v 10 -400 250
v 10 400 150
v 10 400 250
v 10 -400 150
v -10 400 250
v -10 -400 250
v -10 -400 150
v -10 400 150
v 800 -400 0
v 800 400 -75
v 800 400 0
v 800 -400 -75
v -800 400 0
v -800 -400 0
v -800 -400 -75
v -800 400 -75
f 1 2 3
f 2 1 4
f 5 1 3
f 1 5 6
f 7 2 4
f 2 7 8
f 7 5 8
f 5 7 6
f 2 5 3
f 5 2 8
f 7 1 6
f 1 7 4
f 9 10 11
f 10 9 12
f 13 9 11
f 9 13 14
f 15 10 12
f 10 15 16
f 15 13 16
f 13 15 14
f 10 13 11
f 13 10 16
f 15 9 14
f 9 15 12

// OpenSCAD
// working area is the maximum size of the workpiece
working_area_x = 1200;
working_area_y = 600;
working_area_z = 100;

// table_offset is the amount on each dimension that the table is larger 
// than the working area.  The number is for each side - so the table size is:
//          working area + 2 * table offset 
// in each dimension.
table_offset_x = 200;
table_offset_y = 100;


module gantry()
{
	// temporary for now, how thick the rough idea of the gantry is
	gantry_thickness = 20;

	// This is the z height of the gantry
	gantry_height = 100;

	// this is the distance from the working area the bottom of the gantry
	gantry_clearance = 50;
	

	translate([0,0,working_area_z + gantry_height/2 + gantry_clearance]) 
		cube([gantry_thickness, working_area_y + 2 * table_offset_y, gantry_height], center=true);
}

module table()
{
	table_thickness = 75;
	translate([0, 0, -1 * table_thickness/2])
		cube([working_area_x + 2 * table_offset_x, working_area_y + 2 * table_offset_y, table_thickness], center = true);
}

gantry();
table();

// show the working area
% translate([0, 0, working_area_z/2]) 
	cube([working_area_x, working_area_y, working_area_z], center=true);
